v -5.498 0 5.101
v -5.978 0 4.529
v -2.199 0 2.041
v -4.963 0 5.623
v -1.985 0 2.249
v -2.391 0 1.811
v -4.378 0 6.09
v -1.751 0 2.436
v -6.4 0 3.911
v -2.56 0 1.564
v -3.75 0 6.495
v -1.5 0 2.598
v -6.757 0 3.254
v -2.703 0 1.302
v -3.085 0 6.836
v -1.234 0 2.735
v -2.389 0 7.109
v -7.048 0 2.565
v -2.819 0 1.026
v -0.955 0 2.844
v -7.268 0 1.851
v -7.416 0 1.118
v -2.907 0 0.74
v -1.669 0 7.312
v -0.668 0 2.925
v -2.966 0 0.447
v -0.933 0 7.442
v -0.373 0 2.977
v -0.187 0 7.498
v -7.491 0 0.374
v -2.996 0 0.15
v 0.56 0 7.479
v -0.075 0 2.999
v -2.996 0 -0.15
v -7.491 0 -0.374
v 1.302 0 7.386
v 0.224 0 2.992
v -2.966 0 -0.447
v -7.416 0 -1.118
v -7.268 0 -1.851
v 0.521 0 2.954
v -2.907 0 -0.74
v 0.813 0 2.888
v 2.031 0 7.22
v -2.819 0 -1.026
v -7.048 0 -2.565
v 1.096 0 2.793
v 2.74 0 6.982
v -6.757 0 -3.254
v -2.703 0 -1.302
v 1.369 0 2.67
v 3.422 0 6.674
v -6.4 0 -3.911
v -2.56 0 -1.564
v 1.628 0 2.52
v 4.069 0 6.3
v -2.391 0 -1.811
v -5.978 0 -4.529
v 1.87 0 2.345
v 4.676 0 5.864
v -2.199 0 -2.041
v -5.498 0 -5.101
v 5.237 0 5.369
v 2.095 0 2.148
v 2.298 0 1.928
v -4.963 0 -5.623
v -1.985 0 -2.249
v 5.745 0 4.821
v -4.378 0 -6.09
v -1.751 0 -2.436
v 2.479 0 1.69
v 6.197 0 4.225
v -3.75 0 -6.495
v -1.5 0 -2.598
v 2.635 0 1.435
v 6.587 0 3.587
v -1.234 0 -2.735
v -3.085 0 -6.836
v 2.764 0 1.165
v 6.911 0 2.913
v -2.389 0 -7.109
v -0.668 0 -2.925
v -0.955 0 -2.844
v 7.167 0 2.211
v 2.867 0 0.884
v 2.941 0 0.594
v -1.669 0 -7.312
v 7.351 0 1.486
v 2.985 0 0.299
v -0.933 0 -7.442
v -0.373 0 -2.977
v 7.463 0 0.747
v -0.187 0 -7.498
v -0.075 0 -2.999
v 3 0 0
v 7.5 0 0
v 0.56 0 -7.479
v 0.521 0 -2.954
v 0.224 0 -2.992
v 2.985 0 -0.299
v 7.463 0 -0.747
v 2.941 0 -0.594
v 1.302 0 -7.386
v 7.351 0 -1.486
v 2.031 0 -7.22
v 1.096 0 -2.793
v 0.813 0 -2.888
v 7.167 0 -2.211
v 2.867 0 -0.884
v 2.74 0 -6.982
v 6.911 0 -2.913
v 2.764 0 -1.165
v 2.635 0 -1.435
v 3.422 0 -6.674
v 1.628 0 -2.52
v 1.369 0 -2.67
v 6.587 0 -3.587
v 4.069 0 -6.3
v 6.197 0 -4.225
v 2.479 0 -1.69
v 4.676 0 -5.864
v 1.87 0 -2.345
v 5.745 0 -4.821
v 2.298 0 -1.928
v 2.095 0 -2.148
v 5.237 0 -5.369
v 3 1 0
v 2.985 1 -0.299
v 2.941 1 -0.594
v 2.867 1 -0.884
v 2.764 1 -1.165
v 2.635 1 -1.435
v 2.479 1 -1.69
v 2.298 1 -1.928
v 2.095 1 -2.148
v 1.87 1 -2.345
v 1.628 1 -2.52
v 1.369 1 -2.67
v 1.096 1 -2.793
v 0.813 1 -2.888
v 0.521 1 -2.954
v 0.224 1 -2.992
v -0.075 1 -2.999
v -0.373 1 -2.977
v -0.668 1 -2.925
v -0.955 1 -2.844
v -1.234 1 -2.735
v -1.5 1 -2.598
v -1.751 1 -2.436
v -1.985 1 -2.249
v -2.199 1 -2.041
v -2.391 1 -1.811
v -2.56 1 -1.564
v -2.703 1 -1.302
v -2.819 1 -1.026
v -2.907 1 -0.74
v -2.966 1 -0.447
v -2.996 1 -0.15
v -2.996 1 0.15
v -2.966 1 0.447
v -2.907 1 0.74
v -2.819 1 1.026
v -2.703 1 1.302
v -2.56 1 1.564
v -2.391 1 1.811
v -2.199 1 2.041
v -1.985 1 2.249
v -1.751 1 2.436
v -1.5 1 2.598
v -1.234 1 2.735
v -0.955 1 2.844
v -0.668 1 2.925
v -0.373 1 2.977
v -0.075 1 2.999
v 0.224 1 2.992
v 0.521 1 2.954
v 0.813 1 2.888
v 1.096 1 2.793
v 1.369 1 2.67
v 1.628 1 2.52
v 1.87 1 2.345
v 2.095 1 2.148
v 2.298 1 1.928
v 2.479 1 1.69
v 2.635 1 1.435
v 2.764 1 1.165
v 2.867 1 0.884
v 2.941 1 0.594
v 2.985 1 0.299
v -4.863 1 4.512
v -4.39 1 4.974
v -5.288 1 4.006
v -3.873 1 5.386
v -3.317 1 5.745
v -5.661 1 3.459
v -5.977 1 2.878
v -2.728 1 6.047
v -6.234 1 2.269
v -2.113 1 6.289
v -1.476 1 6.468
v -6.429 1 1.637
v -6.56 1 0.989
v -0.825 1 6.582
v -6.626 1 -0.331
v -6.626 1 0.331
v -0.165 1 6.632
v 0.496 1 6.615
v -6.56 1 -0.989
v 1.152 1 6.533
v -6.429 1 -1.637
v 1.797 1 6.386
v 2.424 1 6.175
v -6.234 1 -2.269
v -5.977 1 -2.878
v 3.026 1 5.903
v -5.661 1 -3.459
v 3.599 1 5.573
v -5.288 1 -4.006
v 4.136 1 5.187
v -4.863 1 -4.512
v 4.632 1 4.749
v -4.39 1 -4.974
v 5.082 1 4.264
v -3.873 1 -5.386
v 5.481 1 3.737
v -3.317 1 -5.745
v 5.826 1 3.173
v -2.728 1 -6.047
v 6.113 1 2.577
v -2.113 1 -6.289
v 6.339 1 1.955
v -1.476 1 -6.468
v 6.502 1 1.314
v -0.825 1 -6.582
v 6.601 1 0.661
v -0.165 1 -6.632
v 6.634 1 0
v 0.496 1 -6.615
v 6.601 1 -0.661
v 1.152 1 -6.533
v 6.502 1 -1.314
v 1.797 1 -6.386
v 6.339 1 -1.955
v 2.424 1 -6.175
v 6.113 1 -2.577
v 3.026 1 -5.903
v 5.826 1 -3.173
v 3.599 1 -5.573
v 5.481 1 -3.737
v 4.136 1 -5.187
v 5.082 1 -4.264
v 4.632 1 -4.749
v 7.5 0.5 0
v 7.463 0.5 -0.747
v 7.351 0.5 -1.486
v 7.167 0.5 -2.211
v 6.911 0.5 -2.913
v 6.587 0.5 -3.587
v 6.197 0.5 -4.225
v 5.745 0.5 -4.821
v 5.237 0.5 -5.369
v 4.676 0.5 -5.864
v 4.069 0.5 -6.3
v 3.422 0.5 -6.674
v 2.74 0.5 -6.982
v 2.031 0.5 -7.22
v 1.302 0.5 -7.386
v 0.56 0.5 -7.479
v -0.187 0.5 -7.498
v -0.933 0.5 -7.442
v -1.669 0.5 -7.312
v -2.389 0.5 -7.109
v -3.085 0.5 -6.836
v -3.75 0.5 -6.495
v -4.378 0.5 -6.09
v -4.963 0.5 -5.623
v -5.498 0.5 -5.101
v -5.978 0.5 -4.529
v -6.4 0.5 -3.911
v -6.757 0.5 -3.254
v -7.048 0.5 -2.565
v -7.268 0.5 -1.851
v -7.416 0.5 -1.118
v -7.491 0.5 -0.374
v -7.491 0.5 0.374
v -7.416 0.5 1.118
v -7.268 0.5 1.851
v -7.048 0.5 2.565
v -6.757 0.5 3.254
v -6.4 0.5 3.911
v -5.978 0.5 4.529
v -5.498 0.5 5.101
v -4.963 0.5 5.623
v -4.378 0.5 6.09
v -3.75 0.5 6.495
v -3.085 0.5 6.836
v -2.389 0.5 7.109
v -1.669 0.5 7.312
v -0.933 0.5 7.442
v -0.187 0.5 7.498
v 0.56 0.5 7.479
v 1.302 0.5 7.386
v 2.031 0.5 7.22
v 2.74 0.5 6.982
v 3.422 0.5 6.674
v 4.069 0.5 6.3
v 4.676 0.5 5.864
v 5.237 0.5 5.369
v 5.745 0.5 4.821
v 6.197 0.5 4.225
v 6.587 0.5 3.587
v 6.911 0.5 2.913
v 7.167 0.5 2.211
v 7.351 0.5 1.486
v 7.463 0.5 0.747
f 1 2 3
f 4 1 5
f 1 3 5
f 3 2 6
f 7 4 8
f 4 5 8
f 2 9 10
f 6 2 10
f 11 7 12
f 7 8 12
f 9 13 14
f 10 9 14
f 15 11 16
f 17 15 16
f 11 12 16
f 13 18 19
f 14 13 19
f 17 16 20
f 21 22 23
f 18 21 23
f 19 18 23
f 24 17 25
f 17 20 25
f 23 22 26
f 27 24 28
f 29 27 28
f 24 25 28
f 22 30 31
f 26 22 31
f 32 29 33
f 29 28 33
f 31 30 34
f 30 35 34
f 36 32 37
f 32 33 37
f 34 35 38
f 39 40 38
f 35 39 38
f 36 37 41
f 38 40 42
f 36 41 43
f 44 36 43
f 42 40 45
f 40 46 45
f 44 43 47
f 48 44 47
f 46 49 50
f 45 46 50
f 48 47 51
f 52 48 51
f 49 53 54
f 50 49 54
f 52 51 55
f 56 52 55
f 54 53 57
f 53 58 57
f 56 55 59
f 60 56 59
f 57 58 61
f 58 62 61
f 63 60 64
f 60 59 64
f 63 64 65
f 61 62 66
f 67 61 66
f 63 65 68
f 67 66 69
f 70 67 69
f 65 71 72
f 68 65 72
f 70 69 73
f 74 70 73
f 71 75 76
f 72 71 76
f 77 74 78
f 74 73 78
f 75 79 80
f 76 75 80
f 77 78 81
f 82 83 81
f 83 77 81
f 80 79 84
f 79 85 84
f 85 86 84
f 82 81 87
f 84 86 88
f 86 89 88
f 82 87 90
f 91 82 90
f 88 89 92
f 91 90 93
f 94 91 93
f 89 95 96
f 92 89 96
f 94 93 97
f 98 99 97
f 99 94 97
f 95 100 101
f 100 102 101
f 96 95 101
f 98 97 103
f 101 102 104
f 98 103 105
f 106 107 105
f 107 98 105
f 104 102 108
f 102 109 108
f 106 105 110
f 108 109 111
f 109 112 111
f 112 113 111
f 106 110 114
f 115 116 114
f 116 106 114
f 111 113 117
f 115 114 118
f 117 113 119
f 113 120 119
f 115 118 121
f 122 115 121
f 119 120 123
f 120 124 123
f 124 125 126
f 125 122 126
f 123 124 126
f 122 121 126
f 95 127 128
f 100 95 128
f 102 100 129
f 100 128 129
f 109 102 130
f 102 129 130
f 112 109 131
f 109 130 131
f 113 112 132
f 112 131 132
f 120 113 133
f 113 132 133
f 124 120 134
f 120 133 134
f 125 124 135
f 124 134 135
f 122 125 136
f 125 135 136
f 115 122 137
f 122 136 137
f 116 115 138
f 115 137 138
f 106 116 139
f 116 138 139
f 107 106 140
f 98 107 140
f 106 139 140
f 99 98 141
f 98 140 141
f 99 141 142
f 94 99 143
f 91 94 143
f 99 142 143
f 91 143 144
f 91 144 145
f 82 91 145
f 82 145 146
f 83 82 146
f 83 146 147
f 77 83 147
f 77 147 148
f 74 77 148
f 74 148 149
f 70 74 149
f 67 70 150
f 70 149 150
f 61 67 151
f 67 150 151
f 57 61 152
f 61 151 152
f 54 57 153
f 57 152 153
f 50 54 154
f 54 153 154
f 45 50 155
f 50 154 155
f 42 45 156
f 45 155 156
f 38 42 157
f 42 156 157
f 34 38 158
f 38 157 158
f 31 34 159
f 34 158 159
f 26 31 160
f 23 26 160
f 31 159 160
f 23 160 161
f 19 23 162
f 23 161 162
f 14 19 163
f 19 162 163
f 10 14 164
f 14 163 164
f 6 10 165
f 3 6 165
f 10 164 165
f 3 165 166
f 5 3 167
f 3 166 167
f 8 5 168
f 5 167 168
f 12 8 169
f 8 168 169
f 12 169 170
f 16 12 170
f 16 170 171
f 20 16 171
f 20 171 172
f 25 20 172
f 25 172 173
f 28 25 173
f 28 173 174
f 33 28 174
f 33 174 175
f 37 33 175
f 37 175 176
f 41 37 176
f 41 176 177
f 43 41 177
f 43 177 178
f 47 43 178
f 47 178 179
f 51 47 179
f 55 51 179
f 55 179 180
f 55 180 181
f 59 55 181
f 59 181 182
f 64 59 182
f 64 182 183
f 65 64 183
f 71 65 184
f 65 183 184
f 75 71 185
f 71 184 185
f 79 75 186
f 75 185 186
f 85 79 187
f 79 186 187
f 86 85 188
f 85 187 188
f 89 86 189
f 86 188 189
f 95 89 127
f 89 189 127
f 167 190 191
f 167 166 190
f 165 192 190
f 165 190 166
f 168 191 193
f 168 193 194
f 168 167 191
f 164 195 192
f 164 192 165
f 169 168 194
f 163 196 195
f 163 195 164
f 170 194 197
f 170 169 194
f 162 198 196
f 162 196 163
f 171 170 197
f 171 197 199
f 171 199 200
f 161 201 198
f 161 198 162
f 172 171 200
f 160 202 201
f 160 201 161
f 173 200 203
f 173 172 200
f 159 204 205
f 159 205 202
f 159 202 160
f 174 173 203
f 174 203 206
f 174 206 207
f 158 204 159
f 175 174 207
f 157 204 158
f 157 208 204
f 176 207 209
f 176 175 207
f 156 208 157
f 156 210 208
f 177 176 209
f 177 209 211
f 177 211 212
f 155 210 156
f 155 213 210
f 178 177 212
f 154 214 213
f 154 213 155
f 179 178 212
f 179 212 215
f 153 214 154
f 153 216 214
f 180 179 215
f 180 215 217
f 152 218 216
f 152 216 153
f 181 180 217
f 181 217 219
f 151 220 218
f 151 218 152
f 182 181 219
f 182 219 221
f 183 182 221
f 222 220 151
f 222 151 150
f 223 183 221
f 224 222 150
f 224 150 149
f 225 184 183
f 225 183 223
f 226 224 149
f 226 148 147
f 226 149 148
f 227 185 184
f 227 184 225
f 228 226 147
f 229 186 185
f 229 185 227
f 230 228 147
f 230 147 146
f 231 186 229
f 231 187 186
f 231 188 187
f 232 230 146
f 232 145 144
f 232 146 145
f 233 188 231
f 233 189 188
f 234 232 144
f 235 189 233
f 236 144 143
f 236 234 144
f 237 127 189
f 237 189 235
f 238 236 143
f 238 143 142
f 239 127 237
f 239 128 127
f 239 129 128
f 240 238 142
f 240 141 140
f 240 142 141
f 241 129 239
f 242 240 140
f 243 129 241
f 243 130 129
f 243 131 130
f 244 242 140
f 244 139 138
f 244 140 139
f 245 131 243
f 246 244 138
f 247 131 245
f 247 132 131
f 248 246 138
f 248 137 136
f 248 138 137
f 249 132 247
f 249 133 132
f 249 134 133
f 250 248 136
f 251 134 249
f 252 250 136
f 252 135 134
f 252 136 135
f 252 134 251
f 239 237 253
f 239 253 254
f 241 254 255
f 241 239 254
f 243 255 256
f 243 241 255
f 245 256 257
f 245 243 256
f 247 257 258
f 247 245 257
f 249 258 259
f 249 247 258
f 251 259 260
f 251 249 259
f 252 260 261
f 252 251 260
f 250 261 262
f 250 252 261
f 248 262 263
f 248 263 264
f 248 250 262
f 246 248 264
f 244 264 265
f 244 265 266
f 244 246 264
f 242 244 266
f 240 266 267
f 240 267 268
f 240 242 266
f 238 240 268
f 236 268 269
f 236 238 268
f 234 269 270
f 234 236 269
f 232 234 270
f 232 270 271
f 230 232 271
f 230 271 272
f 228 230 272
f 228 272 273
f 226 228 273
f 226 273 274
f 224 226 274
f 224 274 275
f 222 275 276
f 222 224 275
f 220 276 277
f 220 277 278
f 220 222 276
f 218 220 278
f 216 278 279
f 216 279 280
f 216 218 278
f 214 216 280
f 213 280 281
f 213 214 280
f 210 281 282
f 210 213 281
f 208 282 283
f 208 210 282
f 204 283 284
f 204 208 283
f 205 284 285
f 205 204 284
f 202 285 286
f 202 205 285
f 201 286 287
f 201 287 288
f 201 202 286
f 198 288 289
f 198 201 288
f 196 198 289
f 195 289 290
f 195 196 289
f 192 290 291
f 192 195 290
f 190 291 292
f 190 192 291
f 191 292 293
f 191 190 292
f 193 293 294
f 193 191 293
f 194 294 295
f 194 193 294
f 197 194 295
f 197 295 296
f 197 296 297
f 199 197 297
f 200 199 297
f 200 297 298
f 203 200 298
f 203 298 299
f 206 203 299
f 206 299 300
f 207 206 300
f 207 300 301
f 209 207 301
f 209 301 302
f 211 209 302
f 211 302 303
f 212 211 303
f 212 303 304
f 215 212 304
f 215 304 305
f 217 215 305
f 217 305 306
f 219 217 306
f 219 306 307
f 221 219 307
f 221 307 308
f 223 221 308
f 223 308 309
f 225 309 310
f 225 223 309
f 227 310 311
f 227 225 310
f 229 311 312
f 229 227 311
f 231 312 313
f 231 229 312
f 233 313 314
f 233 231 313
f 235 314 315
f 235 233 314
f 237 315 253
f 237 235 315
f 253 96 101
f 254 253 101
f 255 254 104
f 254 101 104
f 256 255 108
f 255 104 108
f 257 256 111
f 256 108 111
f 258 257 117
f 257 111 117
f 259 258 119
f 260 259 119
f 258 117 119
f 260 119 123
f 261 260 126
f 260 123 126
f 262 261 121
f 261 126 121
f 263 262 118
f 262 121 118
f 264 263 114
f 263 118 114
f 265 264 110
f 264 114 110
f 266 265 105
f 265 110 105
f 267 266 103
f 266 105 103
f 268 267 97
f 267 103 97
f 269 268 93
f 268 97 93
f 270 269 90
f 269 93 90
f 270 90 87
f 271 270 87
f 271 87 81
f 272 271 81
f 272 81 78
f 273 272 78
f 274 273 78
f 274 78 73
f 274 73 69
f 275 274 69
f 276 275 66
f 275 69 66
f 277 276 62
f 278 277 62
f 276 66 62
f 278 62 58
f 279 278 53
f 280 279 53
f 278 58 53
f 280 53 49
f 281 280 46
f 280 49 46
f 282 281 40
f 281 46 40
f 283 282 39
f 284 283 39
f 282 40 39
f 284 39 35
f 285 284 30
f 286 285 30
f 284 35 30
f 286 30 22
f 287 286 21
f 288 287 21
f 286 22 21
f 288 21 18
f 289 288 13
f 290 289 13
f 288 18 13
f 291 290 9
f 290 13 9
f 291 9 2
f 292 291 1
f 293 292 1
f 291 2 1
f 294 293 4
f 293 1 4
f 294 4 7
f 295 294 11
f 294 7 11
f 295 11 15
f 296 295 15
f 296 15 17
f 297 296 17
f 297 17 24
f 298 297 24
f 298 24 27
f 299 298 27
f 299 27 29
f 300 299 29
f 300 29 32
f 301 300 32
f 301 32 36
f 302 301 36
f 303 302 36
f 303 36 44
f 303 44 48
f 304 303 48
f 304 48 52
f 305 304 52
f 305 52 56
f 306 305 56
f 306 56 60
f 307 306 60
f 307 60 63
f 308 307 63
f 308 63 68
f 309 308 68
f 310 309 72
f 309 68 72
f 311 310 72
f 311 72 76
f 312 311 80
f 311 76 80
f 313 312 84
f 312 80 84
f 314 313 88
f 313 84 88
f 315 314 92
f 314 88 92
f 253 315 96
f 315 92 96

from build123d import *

# Parameters (mm, degrees)
SKETCH1_R           = 7.5
BOSS_EXTRUDE1_DEPTH = 1
CHAMFER1_SIZE       = 0.5
CHAMFER1_SIZE2      = 0.866025404
SKETCH2_R           = 3
CUT_EXTRUDE1_DEPTH  = 1


with BuildPart() as part:
    # Sketch1 → Boss-Extrude1 (new body)
    with BuildSketch(Plane(origin=(0, 0, 0), x_dir=(1, 0, 0), z_dir=(0, 1, 0))):
        Circle(SKETCH1_R)
    extrude(amount=BOSS_EXTRUDE1_DEPTH)

    # Chamfer1
    chamfer1_edges = [part.edges().sort_by_distance(p)[0] for p in [
        (-7.5, 1, 0),
    ]]
    chamfer1_side = [part.faces().sort_by_distance(p)[0] for p in [
        (-7.5, 0.5, 0),
    ]]
    chamfer(chamfer1_edges, length=CHAMFER1_SIZE, length2=CHAMFER1_SIZE2, reference=chamfer1_side[0])

    # Sketch2 → Cut-Extrude1 (cut)
    with BuildSketch(Plane(origin=(0, 1, 0), x_dir=(1, 0, 0), z_dir=(0, 1, 0))):
        Circle(SKETCH2_R)
    extrude(amount=-CUT_EXTRUDE1_DEPTH, mode=Mode.SUBTRACT)


solid = part.part
